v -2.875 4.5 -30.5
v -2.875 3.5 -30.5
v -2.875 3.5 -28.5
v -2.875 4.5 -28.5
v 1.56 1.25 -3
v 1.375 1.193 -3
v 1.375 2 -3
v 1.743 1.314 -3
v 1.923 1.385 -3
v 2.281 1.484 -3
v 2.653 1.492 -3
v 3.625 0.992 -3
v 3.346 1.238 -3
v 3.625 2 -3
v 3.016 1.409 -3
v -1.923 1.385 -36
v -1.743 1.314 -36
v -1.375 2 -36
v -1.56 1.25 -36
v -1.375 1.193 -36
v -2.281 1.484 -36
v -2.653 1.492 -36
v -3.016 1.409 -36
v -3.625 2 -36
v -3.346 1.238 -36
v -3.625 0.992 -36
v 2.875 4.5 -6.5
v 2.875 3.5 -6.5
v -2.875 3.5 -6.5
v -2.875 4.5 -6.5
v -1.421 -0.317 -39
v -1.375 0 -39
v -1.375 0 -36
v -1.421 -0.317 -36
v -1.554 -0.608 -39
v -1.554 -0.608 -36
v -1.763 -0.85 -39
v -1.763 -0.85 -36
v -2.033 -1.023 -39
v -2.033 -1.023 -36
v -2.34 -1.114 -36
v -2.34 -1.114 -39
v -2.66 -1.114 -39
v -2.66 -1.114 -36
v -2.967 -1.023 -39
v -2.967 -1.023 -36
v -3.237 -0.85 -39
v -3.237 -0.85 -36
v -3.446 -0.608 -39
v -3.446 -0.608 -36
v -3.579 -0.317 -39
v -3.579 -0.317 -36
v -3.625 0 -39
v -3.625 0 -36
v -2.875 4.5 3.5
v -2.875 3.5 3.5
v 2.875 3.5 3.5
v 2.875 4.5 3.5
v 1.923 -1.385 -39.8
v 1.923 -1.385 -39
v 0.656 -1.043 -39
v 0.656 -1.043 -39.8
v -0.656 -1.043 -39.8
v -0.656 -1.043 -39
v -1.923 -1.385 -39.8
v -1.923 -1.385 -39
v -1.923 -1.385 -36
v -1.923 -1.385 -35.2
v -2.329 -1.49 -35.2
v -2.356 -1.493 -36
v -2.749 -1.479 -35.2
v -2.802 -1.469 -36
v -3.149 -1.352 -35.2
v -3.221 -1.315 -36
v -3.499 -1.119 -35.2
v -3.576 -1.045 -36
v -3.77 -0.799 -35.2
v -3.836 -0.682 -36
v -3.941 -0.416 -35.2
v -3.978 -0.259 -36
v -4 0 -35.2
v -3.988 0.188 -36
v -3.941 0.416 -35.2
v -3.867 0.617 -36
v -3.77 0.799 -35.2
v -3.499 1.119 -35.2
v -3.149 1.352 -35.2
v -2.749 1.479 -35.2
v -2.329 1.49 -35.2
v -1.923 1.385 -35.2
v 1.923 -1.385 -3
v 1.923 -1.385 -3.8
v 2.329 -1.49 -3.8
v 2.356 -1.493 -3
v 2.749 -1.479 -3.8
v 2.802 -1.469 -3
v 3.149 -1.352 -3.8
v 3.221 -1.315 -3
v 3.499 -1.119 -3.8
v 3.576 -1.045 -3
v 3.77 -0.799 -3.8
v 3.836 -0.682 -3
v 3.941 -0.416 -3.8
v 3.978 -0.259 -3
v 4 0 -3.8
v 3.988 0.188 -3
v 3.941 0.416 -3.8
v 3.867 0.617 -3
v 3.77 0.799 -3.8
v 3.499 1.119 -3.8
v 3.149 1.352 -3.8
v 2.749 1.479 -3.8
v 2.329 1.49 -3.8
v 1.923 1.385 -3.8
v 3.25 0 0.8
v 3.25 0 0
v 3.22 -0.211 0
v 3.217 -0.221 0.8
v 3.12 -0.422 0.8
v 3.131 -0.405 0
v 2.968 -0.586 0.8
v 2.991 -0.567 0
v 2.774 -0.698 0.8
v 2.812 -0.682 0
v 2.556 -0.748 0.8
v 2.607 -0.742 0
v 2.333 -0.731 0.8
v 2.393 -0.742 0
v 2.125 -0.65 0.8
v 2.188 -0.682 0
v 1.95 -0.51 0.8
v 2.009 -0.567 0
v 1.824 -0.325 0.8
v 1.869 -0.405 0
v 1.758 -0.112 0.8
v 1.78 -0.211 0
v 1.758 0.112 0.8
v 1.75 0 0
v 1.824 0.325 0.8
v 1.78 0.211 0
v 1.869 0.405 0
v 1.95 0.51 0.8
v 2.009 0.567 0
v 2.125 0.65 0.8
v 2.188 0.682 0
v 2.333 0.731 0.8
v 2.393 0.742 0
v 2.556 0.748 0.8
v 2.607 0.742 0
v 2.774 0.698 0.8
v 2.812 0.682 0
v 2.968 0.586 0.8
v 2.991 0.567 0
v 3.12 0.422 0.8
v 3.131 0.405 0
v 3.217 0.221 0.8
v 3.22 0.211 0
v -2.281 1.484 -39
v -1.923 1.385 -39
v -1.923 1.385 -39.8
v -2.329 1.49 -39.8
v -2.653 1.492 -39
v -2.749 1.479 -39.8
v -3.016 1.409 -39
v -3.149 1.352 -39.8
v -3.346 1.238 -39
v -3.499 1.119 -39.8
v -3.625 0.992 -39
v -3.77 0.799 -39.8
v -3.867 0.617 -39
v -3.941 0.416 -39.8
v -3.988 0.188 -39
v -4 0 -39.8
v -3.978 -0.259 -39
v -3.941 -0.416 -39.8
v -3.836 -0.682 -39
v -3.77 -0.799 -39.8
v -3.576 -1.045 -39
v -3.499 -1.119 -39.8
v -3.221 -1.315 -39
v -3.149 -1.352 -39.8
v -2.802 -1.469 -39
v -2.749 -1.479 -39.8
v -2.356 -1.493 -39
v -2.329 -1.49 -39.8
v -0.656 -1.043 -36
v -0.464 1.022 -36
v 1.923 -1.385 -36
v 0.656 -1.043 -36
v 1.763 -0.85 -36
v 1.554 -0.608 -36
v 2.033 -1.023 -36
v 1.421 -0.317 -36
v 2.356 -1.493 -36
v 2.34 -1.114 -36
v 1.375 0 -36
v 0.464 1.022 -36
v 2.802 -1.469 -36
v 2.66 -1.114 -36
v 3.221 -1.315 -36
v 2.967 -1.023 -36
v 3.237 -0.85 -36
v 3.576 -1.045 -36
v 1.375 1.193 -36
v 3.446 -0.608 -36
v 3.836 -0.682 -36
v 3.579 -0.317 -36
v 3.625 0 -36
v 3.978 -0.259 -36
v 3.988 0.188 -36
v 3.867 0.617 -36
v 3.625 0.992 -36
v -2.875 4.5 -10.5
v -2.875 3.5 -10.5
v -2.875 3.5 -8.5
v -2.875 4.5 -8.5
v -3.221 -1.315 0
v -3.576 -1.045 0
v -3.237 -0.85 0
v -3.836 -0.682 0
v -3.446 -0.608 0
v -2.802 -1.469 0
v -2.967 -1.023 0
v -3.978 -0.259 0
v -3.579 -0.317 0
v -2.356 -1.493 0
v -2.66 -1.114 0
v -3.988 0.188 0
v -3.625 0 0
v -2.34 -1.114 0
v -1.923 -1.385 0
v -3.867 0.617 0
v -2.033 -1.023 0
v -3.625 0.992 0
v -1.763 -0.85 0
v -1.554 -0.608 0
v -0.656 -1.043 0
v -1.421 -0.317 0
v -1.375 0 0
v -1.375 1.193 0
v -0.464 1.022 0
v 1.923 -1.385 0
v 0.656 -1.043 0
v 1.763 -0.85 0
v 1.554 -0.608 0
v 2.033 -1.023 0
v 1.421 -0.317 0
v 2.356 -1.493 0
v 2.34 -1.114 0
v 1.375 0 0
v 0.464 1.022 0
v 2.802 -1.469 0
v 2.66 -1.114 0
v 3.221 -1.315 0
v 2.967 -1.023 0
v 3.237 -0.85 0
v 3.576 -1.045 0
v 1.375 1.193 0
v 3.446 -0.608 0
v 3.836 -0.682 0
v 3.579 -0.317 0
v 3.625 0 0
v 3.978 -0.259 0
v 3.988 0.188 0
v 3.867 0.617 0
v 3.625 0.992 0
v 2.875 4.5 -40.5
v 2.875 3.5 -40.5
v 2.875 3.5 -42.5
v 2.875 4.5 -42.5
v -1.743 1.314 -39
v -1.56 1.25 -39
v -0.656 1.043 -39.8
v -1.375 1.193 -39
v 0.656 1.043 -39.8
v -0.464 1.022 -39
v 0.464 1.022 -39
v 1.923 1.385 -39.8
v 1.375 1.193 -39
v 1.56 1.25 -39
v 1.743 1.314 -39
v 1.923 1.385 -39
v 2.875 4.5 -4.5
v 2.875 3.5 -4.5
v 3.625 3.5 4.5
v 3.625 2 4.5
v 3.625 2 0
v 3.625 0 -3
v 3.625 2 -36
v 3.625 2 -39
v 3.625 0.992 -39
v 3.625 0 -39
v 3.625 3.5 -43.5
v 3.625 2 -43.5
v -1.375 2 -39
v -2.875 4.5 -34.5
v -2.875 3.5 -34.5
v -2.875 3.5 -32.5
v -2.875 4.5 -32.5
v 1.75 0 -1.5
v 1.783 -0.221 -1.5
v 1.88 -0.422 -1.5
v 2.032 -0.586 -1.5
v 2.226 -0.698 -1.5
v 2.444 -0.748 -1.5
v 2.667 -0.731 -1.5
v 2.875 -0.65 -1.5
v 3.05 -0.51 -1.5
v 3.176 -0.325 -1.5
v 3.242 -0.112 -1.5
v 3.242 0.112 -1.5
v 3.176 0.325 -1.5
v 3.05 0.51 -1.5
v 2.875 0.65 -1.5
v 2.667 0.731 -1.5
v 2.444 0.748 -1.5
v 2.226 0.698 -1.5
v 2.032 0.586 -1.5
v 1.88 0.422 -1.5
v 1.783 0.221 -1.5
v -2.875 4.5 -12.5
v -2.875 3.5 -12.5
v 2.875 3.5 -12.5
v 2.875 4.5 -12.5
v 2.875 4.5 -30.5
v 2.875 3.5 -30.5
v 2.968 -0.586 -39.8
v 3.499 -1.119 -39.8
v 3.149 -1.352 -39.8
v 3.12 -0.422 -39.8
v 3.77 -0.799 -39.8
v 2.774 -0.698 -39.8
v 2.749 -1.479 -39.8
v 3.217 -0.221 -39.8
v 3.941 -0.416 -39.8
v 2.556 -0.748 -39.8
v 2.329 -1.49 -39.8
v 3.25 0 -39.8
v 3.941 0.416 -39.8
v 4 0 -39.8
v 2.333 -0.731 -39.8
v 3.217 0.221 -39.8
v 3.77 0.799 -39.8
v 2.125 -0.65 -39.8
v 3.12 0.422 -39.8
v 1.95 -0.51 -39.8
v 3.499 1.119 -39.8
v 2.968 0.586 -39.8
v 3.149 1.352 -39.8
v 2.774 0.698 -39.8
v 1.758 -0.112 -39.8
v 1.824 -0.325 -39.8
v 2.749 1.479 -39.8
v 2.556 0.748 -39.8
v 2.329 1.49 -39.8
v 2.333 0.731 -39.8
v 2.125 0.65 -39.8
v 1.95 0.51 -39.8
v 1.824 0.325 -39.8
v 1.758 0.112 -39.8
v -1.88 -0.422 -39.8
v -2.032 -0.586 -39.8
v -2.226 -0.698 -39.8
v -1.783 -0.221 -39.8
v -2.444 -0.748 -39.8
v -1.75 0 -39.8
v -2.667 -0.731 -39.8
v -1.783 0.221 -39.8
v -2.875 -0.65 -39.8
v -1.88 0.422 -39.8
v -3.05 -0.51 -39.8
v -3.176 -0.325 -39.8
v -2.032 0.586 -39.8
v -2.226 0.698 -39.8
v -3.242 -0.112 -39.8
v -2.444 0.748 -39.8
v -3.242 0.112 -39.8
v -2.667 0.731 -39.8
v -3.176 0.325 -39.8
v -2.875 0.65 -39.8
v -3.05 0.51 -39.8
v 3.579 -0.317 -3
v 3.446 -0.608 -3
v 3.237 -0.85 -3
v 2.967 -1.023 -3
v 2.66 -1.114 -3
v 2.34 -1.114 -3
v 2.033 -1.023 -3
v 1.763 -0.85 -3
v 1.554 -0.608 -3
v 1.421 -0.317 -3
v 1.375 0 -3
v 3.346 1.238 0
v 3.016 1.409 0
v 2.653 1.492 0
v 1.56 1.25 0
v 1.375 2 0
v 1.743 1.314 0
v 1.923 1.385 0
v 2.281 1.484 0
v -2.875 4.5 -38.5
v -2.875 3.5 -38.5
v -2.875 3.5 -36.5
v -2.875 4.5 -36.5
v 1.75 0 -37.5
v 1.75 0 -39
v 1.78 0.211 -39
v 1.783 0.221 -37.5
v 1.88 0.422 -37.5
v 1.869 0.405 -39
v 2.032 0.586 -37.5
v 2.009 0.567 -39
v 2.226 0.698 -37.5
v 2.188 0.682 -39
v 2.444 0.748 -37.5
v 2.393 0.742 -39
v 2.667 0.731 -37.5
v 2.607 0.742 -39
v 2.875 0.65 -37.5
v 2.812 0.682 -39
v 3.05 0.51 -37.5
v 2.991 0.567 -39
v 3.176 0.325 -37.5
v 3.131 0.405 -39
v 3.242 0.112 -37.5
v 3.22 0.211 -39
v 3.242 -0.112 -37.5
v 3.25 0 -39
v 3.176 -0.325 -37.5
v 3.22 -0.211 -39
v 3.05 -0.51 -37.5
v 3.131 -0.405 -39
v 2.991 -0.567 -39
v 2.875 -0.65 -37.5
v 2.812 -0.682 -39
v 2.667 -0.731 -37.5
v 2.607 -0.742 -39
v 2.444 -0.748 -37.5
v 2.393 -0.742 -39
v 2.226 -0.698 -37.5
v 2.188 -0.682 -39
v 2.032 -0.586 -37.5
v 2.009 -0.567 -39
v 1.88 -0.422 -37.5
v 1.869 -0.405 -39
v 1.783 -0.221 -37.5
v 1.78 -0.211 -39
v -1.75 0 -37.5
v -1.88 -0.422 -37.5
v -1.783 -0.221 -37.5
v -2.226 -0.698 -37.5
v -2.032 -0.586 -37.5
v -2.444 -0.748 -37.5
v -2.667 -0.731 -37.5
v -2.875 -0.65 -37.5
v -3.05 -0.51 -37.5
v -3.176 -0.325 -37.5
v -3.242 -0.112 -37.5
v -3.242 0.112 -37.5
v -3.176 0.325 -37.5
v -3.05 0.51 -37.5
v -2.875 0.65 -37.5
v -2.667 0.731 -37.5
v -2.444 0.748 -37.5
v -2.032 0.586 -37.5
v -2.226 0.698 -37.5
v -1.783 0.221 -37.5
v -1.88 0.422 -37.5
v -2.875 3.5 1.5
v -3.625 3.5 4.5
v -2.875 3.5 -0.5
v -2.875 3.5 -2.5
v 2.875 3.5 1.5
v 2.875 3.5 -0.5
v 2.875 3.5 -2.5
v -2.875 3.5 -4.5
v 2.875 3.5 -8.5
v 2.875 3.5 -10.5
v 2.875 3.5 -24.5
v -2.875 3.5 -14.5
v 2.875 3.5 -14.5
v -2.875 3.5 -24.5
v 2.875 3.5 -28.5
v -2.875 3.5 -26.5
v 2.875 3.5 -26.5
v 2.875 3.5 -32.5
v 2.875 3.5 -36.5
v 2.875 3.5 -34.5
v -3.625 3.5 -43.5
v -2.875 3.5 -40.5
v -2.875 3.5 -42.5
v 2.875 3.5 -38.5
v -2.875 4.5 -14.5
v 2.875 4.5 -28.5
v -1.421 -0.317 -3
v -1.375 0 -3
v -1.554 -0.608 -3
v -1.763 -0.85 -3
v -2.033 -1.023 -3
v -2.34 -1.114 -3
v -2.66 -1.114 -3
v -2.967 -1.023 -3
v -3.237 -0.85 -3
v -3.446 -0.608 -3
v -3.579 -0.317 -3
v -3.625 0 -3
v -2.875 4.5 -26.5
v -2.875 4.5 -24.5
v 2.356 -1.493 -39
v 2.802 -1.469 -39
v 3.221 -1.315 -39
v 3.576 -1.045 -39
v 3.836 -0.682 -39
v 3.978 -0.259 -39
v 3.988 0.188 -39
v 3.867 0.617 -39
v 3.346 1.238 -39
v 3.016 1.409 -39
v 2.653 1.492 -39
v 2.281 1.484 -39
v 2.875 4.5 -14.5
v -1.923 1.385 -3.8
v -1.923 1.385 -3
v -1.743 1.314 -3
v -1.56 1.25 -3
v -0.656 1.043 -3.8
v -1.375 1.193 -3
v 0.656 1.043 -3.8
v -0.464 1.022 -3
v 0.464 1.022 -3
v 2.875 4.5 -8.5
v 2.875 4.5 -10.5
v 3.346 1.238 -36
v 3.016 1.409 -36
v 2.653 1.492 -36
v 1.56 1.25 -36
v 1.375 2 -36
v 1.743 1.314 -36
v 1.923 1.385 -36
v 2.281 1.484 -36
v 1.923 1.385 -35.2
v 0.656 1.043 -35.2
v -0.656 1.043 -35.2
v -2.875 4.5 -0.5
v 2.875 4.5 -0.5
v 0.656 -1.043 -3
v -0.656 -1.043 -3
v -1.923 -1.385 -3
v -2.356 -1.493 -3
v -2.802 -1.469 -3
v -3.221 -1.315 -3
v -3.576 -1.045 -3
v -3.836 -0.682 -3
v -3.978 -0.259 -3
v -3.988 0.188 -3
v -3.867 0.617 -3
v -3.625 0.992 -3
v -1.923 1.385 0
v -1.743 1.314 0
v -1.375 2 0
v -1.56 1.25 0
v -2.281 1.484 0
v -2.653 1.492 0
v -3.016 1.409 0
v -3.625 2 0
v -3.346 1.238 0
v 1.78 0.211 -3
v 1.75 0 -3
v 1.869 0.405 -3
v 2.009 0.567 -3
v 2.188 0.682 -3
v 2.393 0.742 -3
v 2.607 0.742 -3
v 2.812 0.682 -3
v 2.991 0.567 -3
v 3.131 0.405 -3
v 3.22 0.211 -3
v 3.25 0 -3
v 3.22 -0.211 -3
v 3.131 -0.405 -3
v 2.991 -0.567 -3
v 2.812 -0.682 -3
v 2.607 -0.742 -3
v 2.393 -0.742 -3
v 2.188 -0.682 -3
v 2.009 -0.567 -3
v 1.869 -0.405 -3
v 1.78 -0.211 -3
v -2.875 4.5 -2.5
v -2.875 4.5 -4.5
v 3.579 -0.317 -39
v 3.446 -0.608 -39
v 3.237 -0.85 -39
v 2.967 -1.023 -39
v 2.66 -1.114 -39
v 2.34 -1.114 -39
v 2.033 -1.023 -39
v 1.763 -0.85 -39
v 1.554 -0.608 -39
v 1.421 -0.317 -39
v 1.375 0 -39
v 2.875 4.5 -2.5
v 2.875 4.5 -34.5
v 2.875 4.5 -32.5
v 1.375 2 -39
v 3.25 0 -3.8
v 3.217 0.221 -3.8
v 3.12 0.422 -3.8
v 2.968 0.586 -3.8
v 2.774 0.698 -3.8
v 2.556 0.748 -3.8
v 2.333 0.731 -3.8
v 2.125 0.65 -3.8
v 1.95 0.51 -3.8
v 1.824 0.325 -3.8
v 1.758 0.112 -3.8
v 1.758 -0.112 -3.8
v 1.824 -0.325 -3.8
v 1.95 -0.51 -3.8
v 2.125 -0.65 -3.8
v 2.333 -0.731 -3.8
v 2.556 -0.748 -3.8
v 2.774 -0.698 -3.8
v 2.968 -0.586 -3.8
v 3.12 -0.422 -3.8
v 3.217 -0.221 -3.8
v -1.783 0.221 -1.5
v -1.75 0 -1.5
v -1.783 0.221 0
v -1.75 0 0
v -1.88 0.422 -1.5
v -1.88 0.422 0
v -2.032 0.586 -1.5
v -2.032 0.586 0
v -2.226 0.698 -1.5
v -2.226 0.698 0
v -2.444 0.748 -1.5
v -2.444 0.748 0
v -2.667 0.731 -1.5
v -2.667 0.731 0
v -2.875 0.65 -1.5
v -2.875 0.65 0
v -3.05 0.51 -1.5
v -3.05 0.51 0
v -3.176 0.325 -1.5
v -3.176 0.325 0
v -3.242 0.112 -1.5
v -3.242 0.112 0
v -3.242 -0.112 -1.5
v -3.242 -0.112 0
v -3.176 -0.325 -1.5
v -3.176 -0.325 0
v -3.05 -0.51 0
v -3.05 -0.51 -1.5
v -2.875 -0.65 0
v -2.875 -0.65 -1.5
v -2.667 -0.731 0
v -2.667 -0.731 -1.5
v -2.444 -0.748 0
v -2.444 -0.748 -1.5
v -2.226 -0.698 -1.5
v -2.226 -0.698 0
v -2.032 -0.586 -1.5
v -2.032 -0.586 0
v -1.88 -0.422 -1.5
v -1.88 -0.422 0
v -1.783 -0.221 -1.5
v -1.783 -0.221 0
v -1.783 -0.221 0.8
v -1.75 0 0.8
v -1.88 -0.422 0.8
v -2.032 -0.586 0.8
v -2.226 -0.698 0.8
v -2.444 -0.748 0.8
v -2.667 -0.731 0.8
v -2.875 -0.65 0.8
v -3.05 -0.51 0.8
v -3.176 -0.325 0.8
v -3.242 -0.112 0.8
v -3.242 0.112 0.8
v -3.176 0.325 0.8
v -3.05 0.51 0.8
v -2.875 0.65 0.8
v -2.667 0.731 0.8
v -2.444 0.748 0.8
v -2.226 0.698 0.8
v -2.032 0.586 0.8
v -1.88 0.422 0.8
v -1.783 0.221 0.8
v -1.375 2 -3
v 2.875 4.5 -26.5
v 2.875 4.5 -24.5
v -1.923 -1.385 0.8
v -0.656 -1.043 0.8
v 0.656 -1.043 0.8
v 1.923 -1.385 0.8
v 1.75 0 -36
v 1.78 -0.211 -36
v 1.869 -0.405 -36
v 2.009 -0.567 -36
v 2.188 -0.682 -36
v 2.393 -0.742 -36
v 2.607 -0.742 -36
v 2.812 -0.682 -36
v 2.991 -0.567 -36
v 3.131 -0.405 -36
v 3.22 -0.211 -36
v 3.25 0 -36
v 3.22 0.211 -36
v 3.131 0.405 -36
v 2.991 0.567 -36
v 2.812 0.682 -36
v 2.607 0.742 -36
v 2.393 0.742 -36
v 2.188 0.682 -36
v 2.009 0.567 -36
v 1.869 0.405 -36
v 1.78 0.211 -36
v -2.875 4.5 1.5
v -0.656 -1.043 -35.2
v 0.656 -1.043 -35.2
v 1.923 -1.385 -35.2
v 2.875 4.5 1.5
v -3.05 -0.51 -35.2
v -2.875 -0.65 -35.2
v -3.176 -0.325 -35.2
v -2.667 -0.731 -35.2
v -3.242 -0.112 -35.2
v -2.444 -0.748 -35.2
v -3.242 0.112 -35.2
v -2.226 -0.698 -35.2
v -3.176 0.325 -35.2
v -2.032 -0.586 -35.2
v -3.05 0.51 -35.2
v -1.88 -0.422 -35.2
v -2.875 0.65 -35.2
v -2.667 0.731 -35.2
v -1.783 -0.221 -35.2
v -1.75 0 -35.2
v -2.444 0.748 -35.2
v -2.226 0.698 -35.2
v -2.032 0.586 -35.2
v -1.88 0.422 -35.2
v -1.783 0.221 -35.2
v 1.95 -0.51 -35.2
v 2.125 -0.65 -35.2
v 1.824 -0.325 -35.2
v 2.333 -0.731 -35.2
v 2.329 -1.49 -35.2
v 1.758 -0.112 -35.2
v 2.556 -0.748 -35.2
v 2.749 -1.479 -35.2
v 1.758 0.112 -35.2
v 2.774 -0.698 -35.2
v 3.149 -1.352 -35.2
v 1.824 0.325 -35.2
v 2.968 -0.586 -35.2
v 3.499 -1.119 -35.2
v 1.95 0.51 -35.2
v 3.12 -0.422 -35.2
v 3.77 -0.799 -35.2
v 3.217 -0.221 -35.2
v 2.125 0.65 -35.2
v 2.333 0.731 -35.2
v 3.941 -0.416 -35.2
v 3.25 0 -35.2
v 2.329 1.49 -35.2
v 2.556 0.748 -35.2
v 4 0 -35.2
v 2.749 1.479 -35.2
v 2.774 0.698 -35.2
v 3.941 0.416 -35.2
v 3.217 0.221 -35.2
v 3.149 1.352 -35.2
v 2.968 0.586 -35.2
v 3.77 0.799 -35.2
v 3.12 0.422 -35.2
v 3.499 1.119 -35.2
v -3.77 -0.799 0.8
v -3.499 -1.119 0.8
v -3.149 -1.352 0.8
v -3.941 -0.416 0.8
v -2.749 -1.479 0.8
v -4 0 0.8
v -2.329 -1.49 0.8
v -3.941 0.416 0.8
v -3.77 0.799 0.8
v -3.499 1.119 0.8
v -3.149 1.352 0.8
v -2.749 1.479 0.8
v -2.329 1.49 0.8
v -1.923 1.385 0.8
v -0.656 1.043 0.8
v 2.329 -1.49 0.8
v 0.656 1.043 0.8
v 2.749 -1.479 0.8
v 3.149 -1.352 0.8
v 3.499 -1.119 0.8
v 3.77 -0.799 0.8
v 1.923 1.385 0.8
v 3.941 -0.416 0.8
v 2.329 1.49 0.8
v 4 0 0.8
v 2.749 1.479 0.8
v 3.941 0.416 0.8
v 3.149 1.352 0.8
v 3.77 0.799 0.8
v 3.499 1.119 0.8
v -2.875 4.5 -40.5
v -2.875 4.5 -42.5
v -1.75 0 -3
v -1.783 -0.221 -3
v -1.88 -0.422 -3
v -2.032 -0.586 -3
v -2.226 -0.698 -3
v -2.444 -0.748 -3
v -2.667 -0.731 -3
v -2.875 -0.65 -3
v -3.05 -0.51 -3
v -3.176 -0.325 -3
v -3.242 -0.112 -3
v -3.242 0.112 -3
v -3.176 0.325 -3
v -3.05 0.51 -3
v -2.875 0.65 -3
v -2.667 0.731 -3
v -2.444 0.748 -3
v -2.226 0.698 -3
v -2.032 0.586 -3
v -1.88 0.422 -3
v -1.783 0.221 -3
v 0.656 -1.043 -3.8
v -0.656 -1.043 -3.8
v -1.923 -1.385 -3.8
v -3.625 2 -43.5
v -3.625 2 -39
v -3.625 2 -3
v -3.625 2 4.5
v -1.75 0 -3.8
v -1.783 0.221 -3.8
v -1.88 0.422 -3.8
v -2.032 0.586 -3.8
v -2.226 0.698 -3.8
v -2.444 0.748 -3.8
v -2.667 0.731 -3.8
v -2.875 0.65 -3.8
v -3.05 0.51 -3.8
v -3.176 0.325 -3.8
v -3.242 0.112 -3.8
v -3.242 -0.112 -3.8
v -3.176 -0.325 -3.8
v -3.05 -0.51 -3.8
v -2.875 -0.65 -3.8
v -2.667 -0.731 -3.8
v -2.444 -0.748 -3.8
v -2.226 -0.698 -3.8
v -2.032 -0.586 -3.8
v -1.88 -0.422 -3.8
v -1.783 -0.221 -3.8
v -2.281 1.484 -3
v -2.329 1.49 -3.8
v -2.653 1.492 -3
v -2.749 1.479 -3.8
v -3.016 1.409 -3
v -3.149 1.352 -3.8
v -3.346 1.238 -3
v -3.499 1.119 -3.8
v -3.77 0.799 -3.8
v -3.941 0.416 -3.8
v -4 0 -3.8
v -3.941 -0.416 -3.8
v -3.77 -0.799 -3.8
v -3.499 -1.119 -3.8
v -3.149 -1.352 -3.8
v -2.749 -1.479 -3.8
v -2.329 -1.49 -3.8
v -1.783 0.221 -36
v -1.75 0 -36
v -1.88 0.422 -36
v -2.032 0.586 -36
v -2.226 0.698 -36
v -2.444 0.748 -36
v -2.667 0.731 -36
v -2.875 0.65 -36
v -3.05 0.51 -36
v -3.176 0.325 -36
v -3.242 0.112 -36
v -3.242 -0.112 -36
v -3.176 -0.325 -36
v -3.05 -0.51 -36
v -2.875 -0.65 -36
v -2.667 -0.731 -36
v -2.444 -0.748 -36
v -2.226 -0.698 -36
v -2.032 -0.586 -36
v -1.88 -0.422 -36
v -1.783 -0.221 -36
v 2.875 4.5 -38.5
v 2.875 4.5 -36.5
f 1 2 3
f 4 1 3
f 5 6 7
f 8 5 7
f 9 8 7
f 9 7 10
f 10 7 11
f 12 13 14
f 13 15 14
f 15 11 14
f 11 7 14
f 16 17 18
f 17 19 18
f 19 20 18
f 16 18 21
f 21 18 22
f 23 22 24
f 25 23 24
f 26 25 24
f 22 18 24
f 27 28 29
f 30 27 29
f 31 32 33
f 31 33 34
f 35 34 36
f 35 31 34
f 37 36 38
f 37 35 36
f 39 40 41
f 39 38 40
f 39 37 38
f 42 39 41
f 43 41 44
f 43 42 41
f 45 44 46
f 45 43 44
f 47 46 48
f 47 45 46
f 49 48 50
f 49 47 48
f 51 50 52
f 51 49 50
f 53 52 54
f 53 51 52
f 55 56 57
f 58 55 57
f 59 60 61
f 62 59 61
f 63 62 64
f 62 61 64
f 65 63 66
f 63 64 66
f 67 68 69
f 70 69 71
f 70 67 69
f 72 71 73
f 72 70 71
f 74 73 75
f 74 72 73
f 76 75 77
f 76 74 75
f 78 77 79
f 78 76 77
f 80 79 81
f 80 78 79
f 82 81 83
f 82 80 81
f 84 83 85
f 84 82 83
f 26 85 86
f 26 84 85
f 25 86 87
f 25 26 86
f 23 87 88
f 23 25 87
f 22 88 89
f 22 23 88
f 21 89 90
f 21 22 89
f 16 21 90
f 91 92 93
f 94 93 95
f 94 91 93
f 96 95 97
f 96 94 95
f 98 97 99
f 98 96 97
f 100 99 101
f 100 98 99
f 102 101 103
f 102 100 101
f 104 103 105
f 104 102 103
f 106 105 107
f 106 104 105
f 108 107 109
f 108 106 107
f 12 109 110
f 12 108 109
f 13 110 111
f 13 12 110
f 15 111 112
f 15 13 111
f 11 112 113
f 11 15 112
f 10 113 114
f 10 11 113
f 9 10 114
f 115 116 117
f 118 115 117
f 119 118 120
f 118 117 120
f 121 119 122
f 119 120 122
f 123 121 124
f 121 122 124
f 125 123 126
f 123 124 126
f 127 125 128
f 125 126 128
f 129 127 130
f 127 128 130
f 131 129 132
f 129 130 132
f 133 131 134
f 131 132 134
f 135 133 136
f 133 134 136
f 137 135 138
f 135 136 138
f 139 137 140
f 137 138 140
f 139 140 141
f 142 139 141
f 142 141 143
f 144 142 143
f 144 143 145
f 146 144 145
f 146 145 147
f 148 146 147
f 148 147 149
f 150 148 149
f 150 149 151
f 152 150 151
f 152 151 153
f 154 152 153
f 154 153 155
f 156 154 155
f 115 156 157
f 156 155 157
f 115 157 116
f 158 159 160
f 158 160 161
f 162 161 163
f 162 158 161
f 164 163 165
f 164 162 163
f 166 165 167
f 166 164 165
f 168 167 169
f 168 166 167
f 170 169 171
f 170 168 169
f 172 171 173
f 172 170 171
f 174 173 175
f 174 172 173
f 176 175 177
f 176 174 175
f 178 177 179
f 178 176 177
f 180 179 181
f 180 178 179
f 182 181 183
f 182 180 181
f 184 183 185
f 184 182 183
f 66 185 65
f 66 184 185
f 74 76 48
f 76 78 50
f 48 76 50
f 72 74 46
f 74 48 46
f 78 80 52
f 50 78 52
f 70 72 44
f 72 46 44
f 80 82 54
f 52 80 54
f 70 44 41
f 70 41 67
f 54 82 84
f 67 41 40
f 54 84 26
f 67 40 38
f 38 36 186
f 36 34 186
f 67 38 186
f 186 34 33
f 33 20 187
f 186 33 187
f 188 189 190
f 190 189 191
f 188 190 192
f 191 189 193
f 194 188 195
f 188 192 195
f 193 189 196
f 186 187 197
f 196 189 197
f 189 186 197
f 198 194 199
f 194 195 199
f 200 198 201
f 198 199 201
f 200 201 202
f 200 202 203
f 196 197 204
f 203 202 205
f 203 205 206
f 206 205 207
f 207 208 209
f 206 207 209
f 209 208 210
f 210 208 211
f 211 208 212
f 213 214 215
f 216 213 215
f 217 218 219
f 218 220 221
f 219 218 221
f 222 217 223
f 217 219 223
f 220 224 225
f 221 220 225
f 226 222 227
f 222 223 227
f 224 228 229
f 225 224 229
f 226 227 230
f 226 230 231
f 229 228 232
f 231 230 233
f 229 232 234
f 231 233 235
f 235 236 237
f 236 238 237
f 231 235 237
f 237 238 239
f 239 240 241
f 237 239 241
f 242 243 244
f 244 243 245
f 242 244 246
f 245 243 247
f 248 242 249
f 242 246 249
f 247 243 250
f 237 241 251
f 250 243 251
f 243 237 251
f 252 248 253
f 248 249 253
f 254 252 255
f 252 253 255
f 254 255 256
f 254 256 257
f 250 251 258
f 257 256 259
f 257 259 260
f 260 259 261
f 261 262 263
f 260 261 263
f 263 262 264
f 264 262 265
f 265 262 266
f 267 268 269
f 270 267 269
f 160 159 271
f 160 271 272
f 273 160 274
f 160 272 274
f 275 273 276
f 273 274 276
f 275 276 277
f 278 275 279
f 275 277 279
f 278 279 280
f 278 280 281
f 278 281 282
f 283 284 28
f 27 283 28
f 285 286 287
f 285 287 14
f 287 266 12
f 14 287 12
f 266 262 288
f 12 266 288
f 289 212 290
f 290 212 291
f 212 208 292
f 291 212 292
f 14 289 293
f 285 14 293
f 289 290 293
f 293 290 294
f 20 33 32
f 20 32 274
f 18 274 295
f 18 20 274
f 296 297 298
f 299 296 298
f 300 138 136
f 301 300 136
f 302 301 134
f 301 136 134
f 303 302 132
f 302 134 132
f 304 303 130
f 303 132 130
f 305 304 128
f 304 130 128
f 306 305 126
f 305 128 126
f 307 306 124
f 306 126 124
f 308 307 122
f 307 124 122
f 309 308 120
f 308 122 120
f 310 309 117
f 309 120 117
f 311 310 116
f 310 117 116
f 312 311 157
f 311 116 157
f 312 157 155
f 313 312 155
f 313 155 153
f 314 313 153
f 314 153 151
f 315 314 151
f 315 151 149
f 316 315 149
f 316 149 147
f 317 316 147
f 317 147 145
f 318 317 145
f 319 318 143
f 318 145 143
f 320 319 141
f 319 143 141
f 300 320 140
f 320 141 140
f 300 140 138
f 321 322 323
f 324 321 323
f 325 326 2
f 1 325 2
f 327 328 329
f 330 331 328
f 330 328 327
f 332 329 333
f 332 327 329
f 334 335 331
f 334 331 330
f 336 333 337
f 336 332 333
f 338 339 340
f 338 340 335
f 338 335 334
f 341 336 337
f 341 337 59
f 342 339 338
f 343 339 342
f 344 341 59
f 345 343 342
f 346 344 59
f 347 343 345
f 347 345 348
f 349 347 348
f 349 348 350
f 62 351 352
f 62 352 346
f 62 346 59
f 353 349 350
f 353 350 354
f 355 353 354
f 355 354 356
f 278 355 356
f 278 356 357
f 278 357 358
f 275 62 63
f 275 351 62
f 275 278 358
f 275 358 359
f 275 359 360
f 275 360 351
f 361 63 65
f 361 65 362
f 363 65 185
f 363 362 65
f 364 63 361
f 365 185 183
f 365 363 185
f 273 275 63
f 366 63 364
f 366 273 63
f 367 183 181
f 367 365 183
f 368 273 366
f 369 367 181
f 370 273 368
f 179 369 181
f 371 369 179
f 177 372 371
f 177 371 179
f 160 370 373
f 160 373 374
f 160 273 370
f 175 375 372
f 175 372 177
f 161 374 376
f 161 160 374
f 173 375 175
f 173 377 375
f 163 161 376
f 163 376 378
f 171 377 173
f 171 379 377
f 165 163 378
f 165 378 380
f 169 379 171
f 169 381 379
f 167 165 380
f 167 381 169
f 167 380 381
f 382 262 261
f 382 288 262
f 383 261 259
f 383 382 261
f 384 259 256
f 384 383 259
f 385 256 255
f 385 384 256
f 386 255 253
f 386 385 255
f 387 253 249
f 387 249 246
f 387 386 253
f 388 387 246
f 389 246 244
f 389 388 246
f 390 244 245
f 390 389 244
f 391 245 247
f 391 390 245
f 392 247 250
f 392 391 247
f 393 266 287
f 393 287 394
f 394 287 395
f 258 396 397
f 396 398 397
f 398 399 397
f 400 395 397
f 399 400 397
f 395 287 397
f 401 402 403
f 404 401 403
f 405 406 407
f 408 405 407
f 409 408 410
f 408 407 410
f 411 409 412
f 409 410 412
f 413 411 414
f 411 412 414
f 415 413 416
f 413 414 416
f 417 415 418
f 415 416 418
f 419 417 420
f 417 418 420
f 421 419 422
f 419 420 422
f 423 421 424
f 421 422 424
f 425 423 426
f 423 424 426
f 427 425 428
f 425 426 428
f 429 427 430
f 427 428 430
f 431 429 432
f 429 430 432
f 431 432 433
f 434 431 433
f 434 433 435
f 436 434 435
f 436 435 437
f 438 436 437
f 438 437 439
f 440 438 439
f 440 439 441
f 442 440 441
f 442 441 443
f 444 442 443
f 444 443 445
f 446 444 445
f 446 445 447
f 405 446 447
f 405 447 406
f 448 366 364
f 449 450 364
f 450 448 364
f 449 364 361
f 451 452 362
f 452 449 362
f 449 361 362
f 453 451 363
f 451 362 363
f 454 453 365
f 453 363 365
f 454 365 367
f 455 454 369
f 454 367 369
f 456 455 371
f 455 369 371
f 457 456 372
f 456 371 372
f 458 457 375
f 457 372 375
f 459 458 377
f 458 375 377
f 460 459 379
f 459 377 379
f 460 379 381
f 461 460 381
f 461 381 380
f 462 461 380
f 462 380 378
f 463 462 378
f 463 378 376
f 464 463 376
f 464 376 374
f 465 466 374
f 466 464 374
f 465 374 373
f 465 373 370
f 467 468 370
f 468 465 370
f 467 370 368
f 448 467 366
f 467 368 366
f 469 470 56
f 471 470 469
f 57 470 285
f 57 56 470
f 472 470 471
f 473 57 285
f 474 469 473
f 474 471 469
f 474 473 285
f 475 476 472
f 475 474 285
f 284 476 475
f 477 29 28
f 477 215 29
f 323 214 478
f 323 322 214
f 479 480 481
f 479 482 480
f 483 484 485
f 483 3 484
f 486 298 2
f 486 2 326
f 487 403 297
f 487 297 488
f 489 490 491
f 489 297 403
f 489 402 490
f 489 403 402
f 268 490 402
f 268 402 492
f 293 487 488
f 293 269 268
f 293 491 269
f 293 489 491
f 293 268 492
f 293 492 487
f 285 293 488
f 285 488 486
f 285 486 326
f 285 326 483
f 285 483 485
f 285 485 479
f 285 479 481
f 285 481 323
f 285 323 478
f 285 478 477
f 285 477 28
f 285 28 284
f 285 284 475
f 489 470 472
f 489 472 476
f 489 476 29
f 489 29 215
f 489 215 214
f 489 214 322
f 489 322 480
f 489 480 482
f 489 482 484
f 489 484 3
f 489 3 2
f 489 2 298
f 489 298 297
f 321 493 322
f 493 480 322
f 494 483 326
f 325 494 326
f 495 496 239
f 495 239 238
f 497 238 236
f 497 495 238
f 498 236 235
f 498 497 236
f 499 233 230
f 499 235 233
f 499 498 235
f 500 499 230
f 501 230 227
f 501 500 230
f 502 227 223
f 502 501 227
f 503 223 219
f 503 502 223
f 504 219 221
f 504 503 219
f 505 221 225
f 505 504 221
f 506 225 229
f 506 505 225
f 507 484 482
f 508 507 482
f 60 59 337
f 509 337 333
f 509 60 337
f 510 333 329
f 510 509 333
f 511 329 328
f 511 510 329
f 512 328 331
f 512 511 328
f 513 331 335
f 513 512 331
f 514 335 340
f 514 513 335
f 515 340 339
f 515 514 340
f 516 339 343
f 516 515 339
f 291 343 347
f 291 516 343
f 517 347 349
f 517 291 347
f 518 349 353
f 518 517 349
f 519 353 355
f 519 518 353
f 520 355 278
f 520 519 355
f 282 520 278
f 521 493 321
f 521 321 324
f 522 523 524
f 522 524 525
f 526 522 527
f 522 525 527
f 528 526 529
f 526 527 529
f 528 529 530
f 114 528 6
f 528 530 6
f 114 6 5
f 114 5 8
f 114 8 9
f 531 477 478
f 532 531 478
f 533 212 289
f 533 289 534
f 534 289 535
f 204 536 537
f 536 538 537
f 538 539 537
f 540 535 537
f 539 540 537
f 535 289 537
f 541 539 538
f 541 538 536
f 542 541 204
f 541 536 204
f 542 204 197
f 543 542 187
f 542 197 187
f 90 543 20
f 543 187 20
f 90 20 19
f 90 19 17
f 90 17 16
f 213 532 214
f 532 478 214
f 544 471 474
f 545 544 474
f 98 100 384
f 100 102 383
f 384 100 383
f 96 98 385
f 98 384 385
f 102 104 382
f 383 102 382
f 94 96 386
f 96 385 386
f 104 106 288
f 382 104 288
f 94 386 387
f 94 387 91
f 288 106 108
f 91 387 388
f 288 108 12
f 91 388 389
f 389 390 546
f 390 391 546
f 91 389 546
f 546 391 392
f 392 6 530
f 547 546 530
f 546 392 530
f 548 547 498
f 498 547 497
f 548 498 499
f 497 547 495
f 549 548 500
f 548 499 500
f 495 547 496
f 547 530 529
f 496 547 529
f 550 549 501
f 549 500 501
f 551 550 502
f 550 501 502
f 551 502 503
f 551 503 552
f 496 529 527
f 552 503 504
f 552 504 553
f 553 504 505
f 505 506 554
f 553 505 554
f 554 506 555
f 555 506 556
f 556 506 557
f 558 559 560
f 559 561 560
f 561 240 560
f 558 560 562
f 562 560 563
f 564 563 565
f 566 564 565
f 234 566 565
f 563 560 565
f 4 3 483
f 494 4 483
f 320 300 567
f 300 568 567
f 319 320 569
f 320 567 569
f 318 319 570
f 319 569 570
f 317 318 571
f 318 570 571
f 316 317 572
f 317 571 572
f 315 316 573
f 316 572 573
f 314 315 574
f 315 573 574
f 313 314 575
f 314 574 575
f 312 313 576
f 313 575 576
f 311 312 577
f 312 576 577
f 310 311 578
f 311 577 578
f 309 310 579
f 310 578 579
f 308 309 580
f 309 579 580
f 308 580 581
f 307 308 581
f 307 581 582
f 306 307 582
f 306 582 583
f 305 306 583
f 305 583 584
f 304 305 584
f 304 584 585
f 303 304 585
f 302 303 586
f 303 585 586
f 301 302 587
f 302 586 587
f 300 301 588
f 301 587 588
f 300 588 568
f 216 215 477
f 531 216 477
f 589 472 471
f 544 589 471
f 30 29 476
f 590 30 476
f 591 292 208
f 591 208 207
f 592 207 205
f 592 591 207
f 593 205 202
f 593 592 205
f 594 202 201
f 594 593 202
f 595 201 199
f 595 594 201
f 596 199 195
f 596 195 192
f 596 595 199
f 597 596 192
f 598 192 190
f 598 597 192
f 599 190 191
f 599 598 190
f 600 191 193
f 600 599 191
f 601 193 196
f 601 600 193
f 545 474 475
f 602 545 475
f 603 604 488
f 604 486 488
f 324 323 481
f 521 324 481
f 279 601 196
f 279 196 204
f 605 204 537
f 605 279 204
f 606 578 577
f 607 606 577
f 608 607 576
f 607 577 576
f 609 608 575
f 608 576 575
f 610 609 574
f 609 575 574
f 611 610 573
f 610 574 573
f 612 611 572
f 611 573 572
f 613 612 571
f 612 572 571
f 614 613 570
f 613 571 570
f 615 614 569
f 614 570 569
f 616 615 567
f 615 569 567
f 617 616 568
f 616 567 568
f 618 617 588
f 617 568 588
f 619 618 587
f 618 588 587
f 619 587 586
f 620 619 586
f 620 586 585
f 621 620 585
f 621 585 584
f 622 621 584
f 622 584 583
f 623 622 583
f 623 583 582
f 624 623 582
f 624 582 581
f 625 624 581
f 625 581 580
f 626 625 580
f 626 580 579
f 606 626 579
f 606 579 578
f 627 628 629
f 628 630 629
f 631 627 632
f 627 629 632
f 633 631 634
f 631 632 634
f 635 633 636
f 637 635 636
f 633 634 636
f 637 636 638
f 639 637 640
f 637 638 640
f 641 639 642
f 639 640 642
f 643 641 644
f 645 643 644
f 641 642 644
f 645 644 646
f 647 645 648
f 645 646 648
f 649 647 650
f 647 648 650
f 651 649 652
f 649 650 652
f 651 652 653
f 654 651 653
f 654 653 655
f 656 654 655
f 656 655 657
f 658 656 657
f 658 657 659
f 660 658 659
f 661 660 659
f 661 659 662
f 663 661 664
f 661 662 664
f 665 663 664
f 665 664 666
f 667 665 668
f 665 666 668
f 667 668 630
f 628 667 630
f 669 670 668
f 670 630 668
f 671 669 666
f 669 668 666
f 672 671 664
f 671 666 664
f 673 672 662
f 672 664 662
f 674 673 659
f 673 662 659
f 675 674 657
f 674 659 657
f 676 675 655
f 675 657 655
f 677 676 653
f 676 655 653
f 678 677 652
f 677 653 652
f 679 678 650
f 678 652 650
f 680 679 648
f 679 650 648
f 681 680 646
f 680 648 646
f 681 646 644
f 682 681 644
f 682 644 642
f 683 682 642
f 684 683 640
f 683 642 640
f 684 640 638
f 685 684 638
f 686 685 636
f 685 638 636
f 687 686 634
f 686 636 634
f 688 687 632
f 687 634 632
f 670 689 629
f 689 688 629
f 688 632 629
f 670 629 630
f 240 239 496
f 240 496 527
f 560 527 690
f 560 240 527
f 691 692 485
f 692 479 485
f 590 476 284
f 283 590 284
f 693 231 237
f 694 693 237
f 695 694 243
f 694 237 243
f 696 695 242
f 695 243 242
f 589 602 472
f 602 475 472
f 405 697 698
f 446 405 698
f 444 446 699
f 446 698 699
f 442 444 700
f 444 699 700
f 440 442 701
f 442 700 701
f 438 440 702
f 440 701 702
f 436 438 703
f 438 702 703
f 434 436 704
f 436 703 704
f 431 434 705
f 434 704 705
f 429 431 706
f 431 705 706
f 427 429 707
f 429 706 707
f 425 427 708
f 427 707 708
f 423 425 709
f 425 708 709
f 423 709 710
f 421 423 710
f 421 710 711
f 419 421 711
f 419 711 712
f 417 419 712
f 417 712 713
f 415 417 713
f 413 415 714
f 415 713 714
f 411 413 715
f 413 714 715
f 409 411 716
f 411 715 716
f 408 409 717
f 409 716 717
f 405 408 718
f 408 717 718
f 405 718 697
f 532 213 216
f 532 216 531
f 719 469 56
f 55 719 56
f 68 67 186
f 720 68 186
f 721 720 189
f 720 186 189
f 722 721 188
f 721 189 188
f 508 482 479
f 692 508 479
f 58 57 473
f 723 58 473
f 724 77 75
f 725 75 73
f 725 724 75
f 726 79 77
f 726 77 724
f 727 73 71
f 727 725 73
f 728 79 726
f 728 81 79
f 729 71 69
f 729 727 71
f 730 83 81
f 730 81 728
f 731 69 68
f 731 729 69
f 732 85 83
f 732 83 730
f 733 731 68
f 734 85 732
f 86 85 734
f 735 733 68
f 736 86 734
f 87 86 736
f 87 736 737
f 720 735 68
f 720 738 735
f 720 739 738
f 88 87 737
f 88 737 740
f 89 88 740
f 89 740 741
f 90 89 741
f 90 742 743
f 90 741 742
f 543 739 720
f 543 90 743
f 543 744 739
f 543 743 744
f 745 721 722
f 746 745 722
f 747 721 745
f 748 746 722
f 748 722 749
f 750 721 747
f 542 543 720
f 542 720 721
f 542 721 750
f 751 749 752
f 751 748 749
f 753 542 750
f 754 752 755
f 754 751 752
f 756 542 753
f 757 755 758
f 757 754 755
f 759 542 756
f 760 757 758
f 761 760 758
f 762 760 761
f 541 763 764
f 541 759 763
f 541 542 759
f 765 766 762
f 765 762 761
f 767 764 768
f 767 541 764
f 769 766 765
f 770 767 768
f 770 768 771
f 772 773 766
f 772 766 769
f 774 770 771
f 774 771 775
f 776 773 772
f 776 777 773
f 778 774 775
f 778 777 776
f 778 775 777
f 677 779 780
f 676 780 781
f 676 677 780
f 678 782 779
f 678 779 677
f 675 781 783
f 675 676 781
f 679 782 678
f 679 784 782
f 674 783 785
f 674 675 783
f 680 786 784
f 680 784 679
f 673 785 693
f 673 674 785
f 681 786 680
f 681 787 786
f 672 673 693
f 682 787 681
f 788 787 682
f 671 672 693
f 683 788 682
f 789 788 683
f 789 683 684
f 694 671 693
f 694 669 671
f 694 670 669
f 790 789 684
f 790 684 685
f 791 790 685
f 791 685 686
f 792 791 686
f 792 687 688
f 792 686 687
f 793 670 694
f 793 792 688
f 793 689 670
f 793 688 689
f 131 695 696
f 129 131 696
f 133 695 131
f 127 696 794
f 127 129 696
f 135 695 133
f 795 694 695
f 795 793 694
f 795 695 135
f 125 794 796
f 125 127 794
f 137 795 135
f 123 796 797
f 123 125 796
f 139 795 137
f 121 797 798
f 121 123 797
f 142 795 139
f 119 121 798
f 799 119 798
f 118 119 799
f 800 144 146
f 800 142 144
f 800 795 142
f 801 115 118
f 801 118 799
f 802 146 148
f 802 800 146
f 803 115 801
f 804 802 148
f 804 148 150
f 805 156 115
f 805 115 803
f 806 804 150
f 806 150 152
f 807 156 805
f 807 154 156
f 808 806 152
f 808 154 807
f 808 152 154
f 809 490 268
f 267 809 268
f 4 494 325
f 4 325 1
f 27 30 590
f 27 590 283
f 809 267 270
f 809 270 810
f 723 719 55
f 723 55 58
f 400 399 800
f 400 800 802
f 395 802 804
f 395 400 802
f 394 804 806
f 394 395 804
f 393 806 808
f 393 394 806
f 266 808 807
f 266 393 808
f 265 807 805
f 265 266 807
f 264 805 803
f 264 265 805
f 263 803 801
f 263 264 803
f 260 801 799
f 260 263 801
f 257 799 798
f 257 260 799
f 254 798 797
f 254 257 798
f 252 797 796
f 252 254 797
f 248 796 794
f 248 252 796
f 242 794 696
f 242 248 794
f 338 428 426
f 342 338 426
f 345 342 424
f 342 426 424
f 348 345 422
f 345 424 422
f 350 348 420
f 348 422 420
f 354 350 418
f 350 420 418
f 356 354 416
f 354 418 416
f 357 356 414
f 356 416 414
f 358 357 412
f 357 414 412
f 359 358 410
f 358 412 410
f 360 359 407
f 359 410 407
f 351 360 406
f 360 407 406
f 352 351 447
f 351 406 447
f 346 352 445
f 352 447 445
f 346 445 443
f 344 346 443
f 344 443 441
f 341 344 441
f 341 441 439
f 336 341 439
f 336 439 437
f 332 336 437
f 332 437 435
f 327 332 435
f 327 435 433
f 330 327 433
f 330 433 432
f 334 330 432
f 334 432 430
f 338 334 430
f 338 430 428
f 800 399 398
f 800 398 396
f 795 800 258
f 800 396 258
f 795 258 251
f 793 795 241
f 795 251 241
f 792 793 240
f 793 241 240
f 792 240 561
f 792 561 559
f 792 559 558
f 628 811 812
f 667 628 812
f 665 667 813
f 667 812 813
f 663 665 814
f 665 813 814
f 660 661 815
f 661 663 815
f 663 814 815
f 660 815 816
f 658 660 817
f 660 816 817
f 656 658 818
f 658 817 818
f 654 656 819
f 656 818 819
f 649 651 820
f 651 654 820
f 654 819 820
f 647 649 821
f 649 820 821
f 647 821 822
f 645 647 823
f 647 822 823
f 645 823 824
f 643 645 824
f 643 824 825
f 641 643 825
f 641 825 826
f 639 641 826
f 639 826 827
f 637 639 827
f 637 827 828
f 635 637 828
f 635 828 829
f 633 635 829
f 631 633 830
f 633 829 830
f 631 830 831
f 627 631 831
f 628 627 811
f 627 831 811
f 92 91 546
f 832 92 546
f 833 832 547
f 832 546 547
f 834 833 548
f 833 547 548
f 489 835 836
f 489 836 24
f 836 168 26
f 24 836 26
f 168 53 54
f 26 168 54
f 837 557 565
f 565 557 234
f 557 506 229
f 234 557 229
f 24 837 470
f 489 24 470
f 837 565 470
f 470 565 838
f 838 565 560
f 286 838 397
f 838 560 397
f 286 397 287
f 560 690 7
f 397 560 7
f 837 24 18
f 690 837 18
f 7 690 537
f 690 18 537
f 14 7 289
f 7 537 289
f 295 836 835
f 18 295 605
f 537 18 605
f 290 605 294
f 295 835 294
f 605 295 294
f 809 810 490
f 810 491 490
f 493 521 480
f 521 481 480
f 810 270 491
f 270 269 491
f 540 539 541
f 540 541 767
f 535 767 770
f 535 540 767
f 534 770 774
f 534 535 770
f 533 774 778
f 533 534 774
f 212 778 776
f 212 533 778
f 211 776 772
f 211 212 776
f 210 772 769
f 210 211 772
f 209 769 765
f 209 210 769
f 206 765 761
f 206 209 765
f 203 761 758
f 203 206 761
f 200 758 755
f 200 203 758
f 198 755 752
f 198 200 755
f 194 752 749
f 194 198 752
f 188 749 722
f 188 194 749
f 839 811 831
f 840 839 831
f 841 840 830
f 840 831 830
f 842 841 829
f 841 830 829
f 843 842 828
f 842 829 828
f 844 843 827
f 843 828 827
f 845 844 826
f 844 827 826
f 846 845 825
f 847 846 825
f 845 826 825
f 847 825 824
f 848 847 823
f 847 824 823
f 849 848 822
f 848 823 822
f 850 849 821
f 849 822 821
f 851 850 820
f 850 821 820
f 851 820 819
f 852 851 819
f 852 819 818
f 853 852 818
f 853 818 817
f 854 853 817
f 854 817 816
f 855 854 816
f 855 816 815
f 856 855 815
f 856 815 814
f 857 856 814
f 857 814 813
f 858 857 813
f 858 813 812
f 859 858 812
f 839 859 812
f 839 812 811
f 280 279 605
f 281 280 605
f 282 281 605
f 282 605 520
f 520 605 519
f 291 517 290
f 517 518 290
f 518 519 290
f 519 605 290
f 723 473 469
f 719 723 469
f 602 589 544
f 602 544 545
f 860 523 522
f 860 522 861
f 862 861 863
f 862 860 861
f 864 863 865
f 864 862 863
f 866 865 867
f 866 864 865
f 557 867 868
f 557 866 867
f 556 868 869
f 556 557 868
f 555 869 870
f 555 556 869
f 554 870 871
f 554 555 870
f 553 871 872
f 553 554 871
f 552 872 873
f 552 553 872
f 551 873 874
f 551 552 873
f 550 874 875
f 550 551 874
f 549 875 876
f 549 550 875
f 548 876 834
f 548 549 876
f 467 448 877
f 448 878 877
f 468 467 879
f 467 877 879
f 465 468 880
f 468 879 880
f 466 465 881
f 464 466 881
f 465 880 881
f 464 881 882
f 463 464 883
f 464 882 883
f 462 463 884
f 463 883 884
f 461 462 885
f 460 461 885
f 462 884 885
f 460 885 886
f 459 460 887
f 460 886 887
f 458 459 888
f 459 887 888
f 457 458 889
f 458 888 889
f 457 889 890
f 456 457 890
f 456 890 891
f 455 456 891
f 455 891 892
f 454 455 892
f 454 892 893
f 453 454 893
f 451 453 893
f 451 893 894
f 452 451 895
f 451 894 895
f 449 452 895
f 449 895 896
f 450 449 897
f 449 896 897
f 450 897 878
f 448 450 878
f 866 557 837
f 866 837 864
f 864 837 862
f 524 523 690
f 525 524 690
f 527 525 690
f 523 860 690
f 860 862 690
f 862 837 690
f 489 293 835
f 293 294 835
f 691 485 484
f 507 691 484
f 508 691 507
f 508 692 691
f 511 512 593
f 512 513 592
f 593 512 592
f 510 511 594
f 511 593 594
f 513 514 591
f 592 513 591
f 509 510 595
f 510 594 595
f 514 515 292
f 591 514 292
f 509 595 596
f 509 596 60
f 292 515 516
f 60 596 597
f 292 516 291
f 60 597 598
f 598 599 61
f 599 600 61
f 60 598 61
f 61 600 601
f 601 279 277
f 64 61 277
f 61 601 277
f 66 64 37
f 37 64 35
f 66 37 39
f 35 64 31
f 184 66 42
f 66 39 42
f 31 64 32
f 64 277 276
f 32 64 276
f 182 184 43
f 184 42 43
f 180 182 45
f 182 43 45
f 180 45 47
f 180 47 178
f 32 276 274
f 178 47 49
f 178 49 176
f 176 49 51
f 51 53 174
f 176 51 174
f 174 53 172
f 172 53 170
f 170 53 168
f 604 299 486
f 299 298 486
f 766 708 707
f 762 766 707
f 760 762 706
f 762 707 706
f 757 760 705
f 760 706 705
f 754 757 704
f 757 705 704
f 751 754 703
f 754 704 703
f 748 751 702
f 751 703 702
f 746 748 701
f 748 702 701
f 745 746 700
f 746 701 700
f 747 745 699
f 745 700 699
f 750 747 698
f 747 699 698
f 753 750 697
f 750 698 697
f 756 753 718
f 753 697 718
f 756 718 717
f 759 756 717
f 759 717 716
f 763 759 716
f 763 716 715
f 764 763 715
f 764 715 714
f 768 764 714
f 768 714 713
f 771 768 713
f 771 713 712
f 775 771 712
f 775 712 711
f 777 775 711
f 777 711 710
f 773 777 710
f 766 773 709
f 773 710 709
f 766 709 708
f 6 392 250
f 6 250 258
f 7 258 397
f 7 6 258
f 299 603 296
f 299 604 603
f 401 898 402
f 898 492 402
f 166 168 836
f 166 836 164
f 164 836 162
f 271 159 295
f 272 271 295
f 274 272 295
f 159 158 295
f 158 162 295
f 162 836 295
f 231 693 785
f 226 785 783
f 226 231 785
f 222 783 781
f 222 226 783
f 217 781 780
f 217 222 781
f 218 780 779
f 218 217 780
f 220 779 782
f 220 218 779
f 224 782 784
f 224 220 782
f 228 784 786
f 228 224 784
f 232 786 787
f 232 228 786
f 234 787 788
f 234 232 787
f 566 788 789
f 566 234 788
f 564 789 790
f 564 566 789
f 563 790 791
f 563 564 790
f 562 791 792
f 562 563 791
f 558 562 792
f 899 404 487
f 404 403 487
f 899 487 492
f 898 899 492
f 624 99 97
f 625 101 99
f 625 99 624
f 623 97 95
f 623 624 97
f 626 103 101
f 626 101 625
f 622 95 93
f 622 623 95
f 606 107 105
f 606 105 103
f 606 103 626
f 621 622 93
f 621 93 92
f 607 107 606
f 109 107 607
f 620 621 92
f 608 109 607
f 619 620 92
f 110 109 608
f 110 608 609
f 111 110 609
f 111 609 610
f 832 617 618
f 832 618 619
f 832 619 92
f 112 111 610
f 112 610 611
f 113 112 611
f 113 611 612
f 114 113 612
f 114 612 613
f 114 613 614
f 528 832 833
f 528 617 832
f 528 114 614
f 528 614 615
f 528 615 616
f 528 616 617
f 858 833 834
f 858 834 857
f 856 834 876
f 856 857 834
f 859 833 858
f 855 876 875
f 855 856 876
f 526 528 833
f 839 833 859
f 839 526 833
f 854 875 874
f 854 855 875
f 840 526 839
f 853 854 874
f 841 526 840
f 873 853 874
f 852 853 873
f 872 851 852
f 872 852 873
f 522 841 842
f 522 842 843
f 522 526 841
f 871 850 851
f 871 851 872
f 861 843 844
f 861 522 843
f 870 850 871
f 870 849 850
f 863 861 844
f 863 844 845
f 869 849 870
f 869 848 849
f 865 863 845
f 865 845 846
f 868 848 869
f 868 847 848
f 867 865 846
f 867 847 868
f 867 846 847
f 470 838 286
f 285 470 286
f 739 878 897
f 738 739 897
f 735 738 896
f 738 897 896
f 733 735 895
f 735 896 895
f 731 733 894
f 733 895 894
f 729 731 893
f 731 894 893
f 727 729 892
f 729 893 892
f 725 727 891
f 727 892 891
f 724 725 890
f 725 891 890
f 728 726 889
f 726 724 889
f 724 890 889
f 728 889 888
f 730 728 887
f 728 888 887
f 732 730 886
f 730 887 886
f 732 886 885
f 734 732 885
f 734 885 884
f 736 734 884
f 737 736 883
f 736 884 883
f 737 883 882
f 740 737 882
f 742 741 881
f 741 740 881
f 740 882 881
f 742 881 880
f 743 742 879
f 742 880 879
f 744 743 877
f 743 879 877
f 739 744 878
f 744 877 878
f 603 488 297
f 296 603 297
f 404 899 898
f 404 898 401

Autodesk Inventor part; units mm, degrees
ref_plane "YZ Plane" through (0, 0, 0) normal (1, 0, 0) x (0, 1, 0)
sketch "Sketch2" plane through (0, 0, 0) normal (0, 0, 1) x (1, 0, 0)
  circle A0 centre (2.5, 0) radius 1.5
  circle A1 centre (-2.5, 0) radius 1.5
  arc A2 (-1.9231, 1.3846) -> (1.9231, 1.3846) centre (0, 6) ccw
  arc A3 (1.9231, -1.3846) -> (-1.9231, -1.3846) centre (0, -6) ccw
  circle A4 centre (2.5, 0) radius 0.75
  circle A5 centre (-2.5, 0) radius 0.75
  point P0 (0, 0)
  dimension "d0" = 3
  dimension "d1" = 3
  dimension "d2" = 6
  dimension "d3" = 6
  dimension "d4" = 2.5
  dimension "d5" = 2.5
  dimension "d6" = 1.5
  dimension "d7" = 1.5
extrude "Extrusion2" add sketch "Sketch2" along normal blind 0.8
sketch "Sketch3" plane through (0, 0, 0) normal (0, 0, -1) x (-1, 0, 0)
  arc A0 (1.9231, -1.3846) -> (-1.9231, -1.3846) centre (0, -6) ccw projected
  arc A1 (1.9231, -1.3846) -> (1.9231, 1.3846) centre (2.5, 0) ccw projected
  arc A2 (-1.9231, 1.3846) -> (1.9231, 1.3846) centre (0, 6) ccw projected
  arc A3 (-1.9231, 1.3846) -> (-1.9231, -1.3846) centre (-2.5, 0) ccw projected
  circle A4 centre (-2.5, 0) radius 0.75 projected
  circle A5 centre (2.5, 0) radius 0.75 projected
  circle A6 centre (-2.5, 0) radius 1.125
  line L0 (-3.625, 2) -> (-1.375, 2)
  line L1 (-1.375, 2) -> (-1.375, 0)
  line L2 (-3.625, 0) -> (-3.625, 2)
  line L3 (0, -8.4) -> (0, 8.4) projected
  point P0 (0, 0)
  point P1 (-3.4922, 1.125)
  point P2 (-3.625, 0.9922)
  point P3 (-1.375, 1.1928)
  dimension "d12" = 2.25
  dimension "d16" = 1.5
  dimension "d20" = 2
extrude "Extrusion3" add sketch "Sketch3" along normal blind 1.5 contours L2 L0 L1 A2 A3 | A3 A2 L1 A6 L2 | A6
mirror "Mirror1" about plane through (0, 0, 0) normal (1, 0, 0) of "Extrusion3"
ref_plane "Work Plane1" through (-2.5, 0, -1.5) normal (0, 0, -1) x (-1, 0, 0)
mirror "Mirror2" about plane through (-2.5, 0, -1.5) normal (0, 0, -1) of "Extrusion3", "Mirror1", "Extrusion2"
sketch "Sketch4" plane through (1.375, 2, 0) normal (0, 1, 0) x (1, 0, 0)
  line L0 (-5, -4.5) -> (2.25, -4.5)
  line L1 (2.25, -4.5) -> (2.25, 1.5)
  line L2 (-5, 1.5) -> (-5, -4.5)
  line L3 (-2.75, 0) -> (-5, 0) projected
  line L4 (-2.75, 0) -> (-2.75, 3) projected
  line L5 (-2.75, 3) -> (-5, 3) projected
  line L6 (-5, 0) -> (-5, 3) projected
  line L7 (0, 0) -> (2.25, 0) projected
  line L8 (2.25, 0) -> (2.25, 3) projected
  line L9 (0, 3) -> (2.25, 3) projected
  line L10 (0, 0) -> (0, 3) projected
  line L11 (-5, 0) -> (-5, 3) projected
  line L12 (2.25, 0) -> (2.25, 3) projected
  line L13 (2.25, 1.5) -> (-5, 1.5)
  line L14 (2.25, 1.5) -> (-5, 1.5)
  line L15 (-5, 1.5) -> (-5, 19.5)
  line L16 (-5, 19.5) -> (2.25, 19.5)
  line L17 (2.25, 19.5) -> (2.25, 1.5)
  point P0 (-1.375, 0)
  point P1 (2.25, 1.5)
  point P2 (2.25, 3)
  dimension "d22" = 18
  dimension "d23" = 6
extrude "Extrusion4" add sketch "Sketch4" along normal blind 1.5
sketch "Sketch5" plane through (1.375, 3.5, 0) normal (0, 1, 0) x (1, 0, 0)
  line L0 (1.5, -1.5) -> (-4.25, -1.5)
  line L1 (-4.25, -1.5) -> (-4.25, -3.5)
  line L2 (-4.25, -3.5) -> (1.5, -3.5)
  line L3 (1.5, -3.5) -> (1.5, -1.5)
  line L4 (-5, -4.5) -> (2.25, -4.5) projected
  line L5 (2.25, -4.5) -> (2.25, 19.5) projected
  line L6 (2.25, 19.5) -> (-5, 19.5) projected
  line L7 (-5, 19.5) -> (-5, -4.5) projected
  point P0 (-1.375, 0)
  dimension "d26" = 5.75
  dimension "d27" = 7.25
  dimension "d28" = 2
  dimension "d29" = 0.75
  dimension "d30" = 1
extrude "Extrusion5" add sketch "Sketch5" along normal blind 1 contours L3 L2 L1 L0
pattern_linear "Rectangular Pattern1" count 5 spacing 4 along (0, 0, -1) of "Extrusion5"
ref_plane "Work Plane2" through (3.625, 2, -19.5) normal (0, 0, -1) x (-1, 0, 0)
mirror "Mirror3" about plane through (3.625, 2, -19.5) normal (0, 0, -1) of "Extrusion4", "Extrusion3", "Mirror1", "Extrusion2", "Mirror2", "Extrusion5", "Rectangular Pattern1"
equation "\"d1\" = d0"
equation "\"d2\" = 2 * d0"
equation "\"d3\" = d2"
equation "\"d4\" = d5"
equation "\"d7\" = d6"
equation "\"d12\" = d16 + 0.5 * d13"
equation "\"d29\" = -0.5 * d26 + 0.5 * d27"
equation "\"d13\" = 1.5"
properties part number "McCrea_CHAIN_INK_WALLE"
